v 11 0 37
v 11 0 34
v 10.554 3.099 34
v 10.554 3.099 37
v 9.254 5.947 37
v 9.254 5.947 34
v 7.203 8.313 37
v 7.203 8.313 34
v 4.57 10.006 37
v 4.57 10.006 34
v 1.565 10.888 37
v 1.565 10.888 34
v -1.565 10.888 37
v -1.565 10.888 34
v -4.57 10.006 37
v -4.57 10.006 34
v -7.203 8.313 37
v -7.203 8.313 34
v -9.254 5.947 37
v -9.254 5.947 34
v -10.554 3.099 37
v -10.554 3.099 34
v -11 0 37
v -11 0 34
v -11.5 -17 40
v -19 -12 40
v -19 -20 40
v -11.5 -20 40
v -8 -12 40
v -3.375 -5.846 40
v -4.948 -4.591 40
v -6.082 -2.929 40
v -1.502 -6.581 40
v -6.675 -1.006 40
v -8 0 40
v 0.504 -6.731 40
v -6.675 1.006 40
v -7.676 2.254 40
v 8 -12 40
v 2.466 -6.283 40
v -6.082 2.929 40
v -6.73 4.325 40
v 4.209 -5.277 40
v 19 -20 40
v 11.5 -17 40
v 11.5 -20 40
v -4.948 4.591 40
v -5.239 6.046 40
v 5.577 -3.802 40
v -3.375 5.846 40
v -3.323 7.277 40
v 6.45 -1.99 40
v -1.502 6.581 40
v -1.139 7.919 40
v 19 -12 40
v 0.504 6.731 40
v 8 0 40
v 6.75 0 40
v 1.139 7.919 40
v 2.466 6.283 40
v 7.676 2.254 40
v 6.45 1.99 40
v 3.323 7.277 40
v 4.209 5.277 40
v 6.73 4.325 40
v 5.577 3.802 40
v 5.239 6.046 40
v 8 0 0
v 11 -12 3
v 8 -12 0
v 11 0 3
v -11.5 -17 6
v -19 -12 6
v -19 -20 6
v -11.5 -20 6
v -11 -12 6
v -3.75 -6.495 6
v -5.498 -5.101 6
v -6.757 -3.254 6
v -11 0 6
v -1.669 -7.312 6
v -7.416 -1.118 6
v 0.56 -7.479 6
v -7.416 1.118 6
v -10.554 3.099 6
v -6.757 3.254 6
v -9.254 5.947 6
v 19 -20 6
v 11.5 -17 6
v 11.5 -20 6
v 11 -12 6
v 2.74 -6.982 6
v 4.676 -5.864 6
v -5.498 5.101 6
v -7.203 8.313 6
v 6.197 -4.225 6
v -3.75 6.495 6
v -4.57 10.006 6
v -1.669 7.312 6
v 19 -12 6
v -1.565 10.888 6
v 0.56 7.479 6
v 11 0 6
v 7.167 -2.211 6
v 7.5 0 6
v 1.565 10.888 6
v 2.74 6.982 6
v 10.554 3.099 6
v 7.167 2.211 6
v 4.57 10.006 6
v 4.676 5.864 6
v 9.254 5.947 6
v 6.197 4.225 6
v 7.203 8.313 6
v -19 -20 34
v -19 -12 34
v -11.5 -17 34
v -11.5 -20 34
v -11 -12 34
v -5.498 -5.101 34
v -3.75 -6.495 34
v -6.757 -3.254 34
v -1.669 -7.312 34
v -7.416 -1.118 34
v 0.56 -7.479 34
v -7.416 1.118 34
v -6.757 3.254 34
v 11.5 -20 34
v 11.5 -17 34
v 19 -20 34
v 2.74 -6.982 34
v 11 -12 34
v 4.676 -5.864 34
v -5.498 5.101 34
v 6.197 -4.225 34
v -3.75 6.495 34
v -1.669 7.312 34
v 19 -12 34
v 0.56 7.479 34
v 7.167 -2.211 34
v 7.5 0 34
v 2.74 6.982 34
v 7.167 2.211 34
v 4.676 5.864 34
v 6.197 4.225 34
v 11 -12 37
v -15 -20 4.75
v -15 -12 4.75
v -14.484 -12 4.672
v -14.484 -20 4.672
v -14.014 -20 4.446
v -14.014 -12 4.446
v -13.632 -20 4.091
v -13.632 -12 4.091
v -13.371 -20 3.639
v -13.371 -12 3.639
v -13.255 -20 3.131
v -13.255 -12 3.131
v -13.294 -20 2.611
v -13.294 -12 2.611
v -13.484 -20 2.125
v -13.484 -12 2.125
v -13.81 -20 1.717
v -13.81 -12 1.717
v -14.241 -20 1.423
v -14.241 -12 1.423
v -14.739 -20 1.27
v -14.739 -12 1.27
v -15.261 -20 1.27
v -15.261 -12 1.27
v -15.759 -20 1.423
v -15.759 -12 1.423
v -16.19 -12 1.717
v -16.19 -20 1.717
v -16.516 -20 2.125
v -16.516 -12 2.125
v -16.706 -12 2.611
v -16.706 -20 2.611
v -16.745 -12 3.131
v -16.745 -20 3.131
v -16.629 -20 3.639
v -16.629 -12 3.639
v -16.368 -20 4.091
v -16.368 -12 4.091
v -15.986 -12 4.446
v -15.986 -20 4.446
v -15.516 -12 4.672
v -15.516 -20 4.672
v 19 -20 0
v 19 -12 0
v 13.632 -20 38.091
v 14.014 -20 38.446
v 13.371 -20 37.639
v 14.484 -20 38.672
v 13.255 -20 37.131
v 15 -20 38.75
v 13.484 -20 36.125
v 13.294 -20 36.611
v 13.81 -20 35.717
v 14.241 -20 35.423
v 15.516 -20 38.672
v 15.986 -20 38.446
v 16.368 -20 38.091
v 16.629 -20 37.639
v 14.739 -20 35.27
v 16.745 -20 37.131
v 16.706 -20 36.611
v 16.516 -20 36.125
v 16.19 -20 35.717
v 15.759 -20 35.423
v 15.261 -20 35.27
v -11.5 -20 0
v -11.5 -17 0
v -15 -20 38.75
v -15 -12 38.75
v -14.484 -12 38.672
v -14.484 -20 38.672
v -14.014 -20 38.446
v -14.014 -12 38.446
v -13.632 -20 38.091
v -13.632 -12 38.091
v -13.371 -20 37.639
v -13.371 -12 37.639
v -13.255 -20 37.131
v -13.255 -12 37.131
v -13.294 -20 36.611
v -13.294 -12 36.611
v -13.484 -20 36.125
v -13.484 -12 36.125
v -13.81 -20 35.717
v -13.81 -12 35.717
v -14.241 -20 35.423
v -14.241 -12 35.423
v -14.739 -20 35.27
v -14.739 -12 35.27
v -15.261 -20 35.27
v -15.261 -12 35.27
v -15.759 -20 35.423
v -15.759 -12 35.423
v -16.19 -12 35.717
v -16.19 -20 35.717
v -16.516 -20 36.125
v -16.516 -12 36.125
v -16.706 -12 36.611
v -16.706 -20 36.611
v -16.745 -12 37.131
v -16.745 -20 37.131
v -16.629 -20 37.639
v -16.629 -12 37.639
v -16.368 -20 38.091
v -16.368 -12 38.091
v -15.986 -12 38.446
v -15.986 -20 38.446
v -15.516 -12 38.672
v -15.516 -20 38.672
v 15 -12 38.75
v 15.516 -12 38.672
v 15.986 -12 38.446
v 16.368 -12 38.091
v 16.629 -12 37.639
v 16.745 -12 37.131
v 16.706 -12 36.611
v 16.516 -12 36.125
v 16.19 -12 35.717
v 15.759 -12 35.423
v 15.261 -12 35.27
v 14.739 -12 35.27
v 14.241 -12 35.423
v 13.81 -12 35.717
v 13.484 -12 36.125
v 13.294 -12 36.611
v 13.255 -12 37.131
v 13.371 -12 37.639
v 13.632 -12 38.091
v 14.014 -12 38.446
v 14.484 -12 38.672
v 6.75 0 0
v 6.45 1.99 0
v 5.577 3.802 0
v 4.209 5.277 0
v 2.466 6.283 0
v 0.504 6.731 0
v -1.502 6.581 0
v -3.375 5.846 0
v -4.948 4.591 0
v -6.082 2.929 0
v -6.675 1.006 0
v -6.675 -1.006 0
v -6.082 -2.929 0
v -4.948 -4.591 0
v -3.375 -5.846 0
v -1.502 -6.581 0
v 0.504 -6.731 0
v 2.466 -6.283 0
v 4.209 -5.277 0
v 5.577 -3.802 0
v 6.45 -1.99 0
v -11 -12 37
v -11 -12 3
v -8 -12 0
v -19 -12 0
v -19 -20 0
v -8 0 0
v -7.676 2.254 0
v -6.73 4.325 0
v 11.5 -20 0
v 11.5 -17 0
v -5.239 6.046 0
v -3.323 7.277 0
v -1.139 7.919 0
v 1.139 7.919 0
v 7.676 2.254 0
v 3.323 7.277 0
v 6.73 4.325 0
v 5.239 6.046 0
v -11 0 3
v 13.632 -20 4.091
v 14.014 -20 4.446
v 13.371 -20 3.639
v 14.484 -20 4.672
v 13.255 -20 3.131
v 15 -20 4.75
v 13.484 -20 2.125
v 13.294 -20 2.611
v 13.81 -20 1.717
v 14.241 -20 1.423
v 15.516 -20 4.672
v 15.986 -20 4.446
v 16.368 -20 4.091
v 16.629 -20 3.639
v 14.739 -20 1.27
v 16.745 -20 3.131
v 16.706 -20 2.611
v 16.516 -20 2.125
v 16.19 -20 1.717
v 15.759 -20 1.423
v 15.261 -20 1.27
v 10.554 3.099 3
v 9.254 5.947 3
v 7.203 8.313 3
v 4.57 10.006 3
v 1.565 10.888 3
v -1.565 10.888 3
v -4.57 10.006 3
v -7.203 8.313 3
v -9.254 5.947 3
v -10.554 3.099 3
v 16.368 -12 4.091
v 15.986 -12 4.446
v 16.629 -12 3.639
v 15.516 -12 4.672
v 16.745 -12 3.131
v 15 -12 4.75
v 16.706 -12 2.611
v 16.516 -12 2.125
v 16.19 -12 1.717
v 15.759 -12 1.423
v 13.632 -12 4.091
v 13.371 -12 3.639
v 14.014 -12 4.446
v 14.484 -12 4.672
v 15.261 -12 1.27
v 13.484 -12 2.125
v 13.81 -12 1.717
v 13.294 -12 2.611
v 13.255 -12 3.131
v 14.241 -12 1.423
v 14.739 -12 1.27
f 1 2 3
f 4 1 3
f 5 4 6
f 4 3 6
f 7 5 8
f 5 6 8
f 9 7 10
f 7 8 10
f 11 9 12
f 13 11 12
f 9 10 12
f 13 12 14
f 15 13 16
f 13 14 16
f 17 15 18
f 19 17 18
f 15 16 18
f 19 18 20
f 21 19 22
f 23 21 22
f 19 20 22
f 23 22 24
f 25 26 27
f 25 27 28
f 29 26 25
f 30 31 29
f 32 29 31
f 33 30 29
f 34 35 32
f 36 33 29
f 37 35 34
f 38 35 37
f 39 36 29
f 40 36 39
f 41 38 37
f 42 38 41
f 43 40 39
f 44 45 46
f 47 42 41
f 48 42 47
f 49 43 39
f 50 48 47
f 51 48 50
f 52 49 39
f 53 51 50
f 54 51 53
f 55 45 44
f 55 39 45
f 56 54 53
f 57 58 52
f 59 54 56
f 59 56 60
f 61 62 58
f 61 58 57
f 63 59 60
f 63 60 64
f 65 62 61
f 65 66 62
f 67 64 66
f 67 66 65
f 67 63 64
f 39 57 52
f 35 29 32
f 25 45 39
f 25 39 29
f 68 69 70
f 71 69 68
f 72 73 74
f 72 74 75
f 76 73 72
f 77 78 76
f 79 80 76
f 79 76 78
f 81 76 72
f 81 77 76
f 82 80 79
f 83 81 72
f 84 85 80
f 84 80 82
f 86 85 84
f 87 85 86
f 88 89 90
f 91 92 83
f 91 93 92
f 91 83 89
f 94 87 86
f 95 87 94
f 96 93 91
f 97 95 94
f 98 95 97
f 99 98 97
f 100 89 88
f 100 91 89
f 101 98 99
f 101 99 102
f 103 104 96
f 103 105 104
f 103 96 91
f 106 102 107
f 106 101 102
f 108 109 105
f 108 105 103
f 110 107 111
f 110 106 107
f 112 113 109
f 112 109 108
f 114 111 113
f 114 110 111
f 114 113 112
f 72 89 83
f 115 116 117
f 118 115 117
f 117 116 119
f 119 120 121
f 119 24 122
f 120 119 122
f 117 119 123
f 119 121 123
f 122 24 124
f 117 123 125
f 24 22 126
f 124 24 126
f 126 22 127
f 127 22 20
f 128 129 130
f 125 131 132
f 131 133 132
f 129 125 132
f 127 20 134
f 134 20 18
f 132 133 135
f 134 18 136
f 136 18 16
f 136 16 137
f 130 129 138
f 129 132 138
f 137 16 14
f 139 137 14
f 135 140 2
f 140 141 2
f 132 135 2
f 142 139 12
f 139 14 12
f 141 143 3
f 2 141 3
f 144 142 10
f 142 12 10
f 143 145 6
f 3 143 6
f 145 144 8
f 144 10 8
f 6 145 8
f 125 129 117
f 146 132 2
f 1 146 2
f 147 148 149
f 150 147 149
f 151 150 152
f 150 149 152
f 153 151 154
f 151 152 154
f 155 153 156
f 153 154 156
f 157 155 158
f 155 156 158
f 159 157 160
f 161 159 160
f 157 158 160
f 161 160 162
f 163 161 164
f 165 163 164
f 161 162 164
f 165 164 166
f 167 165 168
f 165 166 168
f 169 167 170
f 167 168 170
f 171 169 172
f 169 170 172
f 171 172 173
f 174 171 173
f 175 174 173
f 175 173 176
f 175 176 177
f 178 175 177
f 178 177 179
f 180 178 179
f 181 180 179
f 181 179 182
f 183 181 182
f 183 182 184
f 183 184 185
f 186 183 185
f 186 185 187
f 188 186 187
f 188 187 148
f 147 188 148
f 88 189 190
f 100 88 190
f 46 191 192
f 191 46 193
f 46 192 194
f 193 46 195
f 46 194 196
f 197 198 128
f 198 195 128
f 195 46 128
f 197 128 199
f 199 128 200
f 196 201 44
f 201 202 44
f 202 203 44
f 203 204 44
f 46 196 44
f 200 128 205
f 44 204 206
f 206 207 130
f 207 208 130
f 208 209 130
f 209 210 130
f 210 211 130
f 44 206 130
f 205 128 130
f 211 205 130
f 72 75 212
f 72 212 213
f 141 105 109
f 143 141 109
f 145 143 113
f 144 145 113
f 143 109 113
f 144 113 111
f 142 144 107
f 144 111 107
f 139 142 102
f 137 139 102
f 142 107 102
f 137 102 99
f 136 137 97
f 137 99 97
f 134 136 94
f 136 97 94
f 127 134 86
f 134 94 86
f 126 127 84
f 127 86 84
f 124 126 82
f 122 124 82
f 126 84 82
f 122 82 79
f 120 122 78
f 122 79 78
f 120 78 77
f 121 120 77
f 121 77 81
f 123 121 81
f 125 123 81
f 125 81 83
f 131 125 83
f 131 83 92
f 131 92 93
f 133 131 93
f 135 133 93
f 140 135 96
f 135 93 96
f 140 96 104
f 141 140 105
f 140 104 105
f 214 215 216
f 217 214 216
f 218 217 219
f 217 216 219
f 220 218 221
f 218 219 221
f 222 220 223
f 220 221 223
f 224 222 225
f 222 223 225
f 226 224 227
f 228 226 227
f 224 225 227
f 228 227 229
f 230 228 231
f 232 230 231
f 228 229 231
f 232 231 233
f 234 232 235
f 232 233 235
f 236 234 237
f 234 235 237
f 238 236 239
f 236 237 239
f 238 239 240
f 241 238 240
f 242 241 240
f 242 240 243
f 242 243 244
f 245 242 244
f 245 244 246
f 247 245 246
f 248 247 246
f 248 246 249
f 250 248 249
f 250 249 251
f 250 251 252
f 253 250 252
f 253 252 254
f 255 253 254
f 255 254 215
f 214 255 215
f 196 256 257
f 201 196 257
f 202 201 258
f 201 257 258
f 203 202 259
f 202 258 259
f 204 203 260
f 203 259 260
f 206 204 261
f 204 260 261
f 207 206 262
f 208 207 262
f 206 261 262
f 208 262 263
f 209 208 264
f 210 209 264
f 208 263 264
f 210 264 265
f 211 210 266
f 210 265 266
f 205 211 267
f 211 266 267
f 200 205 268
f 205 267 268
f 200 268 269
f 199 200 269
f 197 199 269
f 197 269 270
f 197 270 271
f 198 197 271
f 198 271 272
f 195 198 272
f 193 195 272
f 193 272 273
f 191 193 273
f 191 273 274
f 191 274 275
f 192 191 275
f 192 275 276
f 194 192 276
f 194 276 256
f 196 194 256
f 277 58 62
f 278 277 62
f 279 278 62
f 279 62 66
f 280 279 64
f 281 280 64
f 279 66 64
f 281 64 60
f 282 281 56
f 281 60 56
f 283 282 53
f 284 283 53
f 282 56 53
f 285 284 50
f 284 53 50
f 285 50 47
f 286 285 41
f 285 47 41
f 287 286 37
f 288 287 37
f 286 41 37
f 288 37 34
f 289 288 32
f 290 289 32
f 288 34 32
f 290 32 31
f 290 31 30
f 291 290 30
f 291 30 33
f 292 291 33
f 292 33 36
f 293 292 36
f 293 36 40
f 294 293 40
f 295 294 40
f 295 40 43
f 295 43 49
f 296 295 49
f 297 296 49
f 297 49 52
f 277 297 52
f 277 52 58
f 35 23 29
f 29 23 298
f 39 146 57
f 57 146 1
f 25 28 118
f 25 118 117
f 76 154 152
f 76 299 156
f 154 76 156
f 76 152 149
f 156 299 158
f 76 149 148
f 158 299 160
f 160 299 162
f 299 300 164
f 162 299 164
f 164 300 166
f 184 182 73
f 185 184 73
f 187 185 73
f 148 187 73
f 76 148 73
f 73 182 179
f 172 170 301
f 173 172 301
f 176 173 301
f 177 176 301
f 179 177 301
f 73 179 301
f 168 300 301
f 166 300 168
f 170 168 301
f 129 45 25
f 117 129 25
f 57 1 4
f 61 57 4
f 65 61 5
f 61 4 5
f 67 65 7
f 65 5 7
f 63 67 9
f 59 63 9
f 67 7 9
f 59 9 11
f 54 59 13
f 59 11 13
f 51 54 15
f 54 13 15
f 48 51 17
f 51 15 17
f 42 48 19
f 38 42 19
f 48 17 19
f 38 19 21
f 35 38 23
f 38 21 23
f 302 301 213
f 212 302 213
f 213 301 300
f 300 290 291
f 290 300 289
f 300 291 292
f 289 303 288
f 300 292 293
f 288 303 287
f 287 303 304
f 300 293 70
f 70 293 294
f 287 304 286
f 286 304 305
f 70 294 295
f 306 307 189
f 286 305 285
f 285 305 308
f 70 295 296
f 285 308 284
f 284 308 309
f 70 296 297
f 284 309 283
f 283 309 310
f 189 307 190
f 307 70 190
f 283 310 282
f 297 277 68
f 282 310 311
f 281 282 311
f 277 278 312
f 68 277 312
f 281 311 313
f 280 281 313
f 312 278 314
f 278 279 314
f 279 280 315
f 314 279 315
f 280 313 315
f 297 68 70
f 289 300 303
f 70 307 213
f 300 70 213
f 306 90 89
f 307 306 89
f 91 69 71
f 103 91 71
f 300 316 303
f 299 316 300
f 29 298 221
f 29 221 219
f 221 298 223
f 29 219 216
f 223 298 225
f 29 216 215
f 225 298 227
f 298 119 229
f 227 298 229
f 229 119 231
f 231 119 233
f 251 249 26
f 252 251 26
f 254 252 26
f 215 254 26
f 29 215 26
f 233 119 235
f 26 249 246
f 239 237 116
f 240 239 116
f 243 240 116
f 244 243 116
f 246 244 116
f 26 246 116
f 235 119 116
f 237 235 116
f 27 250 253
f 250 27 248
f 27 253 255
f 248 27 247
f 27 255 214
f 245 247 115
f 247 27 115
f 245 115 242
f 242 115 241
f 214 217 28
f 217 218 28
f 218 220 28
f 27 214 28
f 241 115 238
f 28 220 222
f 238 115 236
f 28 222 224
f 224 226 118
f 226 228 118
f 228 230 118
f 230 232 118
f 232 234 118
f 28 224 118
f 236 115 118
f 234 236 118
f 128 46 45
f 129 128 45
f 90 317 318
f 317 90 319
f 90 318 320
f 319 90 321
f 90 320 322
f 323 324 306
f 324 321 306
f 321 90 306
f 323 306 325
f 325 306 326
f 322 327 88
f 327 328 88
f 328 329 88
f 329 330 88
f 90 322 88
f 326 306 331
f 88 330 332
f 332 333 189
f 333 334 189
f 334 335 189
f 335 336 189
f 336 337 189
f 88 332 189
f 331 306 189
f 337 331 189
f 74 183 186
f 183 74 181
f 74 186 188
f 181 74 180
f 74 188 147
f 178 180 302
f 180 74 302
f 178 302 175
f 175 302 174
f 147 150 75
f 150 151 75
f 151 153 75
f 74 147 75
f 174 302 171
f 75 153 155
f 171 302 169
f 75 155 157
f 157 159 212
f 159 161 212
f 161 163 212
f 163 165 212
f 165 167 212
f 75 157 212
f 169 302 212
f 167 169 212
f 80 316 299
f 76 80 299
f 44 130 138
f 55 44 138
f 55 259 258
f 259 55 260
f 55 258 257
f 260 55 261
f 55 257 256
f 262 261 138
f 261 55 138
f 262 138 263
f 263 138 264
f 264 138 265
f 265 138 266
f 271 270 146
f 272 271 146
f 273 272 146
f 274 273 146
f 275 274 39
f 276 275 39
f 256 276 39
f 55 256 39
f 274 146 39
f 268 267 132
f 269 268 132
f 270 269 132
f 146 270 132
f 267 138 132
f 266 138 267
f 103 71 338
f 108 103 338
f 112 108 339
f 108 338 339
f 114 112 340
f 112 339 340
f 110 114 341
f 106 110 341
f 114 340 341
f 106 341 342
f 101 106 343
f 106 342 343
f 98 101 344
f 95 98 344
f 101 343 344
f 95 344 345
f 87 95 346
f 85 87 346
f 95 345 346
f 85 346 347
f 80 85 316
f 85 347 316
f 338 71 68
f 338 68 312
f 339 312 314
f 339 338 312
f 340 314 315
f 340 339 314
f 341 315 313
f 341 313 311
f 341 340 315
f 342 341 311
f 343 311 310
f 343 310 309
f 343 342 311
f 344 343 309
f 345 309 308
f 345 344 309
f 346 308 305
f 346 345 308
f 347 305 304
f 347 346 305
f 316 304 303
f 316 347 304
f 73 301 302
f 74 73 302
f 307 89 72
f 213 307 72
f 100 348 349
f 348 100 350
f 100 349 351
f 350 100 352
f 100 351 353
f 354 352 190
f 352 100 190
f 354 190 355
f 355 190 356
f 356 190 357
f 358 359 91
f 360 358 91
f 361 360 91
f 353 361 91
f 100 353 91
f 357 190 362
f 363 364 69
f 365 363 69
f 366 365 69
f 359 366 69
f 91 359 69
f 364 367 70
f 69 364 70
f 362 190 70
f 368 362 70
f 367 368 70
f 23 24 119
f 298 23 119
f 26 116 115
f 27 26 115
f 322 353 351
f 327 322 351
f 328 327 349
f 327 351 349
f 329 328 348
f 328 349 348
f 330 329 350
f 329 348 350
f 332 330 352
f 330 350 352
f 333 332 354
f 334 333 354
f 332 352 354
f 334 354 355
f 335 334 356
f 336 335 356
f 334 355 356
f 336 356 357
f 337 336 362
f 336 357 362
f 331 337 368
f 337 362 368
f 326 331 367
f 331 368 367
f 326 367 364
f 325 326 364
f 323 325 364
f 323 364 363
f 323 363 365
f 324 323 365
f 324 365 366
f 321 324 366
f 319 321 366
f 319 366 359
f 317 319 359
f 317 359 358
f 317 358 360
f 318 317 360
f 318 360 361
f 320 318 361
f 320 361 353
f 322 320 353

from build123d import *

# Parameters (mm, degrees)
BOSS_EXTRUDE1_DEPTH     = 6
SKETCH2_R               = 7.5
BOSS_EXTRUDE2_DEPTH     = 28
BOSS_EXTRUDE3_DEPTH     = 6
SKETCH4_R               = 6.75
CUT_EXTRUDE1_DEPTH      = 49.590122453
CUT_EXTRUDE2_DEPTH      = 49.590122453
CUT_EXTRUDE2_DEPTH_BACK = 49.590122453
SKETCH5_W               = 23
SKETCH5_H               = 3
SKETCH6_R               = 1.75
CUT_EXTRUDE3_DEPTH      = 50.899899799
CHAMFER1_SIZE           = 3


with BuildPart() as part:
    # Sketch1 → Boss-Extrude1 (new body)
    with BuildSketch(Plane.XY):
        with BuildLine():
            Line((-11, 0), (-11, -12))
            Line((-11, -12), (-19, -12))
            Line((-19, -12), (-19, -20))
            Line((-19, -20), (-11, -20))
            Line((-11, -20), (11, -20))
            Line((11, -20), (19, -20))
            Line((19, -20), (19, -12))
            Line((19, -12), (11, -12))
            Line((11, -12), (11, 0))
            ThreePointArc((11, 0), (0, 11), (-11, 0))
        make_face()
    extrude(amount=BOSS_EXTRUDE1_DEPTH)

    # Sketch2 → Boss-Extrude2 (add)
    with BuildSketch(Plane.XY.offset(6)):
        Circle(SKETCH2_R)
    extrude(amount=BOSS_EXTRUDE2_DEPTH)

    # Sketch3 → Boss-Extrude3 (add)
    with BuildSketch(Plane.XY.offset(34)):
        with BuildLine():
            Line((-11, 0), (-11, -12))
            Line((-11, -12), (-19, -12))
            Line((-19, -12), (-19, -20))
            Line((-19, -20), (19, -20))
            Line((19, -20), (19, -12))
            Line((19, -12), (11, -12))
            Line((11, -12), (11, 0))
            ThreePointArc((11, 0), (0, 11), (-11, 0))
        make_face()
    extrude(amount=BOSS_EXTRUDE3_DEPTH)

    # Sketch4 → Cut-Extrude1 (cut, through all)
    with BuildSketch(Plane.XY.offset(40)):
        Circle(SKETCH4_R)
    extrude(amount=-CUT_EXTRUDE1_DEPTH, mode=Mode.SUBTRACT)

    # Sketch5 → Cut-Extrude2 (cut, two sides: drawn at the far end of the back side and taken through both)
    with BuildSketch(Plane(origin=(0, 0, 0), x_dir=(-1, 0, 0), z_dir=(0, 0, -1)).offset(-CUT_EXTRUDE2_DEPTH_BACK)):
        with Locations((0, -18.5)):
            Rectangle(SKETCH5_W, SKETCH5_H)
    extrude(amount=CUT_EXTRUDE2_DEPTH + CUT_EXTRUDE2_DEPTH_BACK, mode=Mode.SUBTRACT)

    # Sketch6 → Cut-Extrude3 (cut, through all)
    with BuildSketch(Plane(origin=(0, -12, 0), x_dir=(1, 0, 0), z_dir=(0, 1, 0))):
        with Locations(Location((-15, -3, 0), (0, 0, 270))):
            Circle(SKETCH6_R)
        with Locations(Location((15, -3, 0), (0, 0, 270))):
            Circle(SKETCH6_R)
        with Locations(Location((15, -37, 0), (0, 0, 270))):
            Circle(SKETCH6_R)
        with Locations(Location((-15, -37, 0), (0, 0, 270))):
            Circle(SKETCH6_R)
    extrude(amount=-CUT_EXTRUDE3_DEPTH, mode=Mode.SUBTRACT)

    # Chamfer1
    chamfer1_edges = [part.edges().sort_by_distance(p)[0] for p in [
        (-11, -6, 0),
        (0, 11, 0),
        (11, -6, 0),
        (11, -6, 40),
        (0, 11, 40),
        (-11, -6, 40),
    ]]
    chamfer(chamfer1_edges, length=CHAMFER1_SIZE)


solid = part.part
